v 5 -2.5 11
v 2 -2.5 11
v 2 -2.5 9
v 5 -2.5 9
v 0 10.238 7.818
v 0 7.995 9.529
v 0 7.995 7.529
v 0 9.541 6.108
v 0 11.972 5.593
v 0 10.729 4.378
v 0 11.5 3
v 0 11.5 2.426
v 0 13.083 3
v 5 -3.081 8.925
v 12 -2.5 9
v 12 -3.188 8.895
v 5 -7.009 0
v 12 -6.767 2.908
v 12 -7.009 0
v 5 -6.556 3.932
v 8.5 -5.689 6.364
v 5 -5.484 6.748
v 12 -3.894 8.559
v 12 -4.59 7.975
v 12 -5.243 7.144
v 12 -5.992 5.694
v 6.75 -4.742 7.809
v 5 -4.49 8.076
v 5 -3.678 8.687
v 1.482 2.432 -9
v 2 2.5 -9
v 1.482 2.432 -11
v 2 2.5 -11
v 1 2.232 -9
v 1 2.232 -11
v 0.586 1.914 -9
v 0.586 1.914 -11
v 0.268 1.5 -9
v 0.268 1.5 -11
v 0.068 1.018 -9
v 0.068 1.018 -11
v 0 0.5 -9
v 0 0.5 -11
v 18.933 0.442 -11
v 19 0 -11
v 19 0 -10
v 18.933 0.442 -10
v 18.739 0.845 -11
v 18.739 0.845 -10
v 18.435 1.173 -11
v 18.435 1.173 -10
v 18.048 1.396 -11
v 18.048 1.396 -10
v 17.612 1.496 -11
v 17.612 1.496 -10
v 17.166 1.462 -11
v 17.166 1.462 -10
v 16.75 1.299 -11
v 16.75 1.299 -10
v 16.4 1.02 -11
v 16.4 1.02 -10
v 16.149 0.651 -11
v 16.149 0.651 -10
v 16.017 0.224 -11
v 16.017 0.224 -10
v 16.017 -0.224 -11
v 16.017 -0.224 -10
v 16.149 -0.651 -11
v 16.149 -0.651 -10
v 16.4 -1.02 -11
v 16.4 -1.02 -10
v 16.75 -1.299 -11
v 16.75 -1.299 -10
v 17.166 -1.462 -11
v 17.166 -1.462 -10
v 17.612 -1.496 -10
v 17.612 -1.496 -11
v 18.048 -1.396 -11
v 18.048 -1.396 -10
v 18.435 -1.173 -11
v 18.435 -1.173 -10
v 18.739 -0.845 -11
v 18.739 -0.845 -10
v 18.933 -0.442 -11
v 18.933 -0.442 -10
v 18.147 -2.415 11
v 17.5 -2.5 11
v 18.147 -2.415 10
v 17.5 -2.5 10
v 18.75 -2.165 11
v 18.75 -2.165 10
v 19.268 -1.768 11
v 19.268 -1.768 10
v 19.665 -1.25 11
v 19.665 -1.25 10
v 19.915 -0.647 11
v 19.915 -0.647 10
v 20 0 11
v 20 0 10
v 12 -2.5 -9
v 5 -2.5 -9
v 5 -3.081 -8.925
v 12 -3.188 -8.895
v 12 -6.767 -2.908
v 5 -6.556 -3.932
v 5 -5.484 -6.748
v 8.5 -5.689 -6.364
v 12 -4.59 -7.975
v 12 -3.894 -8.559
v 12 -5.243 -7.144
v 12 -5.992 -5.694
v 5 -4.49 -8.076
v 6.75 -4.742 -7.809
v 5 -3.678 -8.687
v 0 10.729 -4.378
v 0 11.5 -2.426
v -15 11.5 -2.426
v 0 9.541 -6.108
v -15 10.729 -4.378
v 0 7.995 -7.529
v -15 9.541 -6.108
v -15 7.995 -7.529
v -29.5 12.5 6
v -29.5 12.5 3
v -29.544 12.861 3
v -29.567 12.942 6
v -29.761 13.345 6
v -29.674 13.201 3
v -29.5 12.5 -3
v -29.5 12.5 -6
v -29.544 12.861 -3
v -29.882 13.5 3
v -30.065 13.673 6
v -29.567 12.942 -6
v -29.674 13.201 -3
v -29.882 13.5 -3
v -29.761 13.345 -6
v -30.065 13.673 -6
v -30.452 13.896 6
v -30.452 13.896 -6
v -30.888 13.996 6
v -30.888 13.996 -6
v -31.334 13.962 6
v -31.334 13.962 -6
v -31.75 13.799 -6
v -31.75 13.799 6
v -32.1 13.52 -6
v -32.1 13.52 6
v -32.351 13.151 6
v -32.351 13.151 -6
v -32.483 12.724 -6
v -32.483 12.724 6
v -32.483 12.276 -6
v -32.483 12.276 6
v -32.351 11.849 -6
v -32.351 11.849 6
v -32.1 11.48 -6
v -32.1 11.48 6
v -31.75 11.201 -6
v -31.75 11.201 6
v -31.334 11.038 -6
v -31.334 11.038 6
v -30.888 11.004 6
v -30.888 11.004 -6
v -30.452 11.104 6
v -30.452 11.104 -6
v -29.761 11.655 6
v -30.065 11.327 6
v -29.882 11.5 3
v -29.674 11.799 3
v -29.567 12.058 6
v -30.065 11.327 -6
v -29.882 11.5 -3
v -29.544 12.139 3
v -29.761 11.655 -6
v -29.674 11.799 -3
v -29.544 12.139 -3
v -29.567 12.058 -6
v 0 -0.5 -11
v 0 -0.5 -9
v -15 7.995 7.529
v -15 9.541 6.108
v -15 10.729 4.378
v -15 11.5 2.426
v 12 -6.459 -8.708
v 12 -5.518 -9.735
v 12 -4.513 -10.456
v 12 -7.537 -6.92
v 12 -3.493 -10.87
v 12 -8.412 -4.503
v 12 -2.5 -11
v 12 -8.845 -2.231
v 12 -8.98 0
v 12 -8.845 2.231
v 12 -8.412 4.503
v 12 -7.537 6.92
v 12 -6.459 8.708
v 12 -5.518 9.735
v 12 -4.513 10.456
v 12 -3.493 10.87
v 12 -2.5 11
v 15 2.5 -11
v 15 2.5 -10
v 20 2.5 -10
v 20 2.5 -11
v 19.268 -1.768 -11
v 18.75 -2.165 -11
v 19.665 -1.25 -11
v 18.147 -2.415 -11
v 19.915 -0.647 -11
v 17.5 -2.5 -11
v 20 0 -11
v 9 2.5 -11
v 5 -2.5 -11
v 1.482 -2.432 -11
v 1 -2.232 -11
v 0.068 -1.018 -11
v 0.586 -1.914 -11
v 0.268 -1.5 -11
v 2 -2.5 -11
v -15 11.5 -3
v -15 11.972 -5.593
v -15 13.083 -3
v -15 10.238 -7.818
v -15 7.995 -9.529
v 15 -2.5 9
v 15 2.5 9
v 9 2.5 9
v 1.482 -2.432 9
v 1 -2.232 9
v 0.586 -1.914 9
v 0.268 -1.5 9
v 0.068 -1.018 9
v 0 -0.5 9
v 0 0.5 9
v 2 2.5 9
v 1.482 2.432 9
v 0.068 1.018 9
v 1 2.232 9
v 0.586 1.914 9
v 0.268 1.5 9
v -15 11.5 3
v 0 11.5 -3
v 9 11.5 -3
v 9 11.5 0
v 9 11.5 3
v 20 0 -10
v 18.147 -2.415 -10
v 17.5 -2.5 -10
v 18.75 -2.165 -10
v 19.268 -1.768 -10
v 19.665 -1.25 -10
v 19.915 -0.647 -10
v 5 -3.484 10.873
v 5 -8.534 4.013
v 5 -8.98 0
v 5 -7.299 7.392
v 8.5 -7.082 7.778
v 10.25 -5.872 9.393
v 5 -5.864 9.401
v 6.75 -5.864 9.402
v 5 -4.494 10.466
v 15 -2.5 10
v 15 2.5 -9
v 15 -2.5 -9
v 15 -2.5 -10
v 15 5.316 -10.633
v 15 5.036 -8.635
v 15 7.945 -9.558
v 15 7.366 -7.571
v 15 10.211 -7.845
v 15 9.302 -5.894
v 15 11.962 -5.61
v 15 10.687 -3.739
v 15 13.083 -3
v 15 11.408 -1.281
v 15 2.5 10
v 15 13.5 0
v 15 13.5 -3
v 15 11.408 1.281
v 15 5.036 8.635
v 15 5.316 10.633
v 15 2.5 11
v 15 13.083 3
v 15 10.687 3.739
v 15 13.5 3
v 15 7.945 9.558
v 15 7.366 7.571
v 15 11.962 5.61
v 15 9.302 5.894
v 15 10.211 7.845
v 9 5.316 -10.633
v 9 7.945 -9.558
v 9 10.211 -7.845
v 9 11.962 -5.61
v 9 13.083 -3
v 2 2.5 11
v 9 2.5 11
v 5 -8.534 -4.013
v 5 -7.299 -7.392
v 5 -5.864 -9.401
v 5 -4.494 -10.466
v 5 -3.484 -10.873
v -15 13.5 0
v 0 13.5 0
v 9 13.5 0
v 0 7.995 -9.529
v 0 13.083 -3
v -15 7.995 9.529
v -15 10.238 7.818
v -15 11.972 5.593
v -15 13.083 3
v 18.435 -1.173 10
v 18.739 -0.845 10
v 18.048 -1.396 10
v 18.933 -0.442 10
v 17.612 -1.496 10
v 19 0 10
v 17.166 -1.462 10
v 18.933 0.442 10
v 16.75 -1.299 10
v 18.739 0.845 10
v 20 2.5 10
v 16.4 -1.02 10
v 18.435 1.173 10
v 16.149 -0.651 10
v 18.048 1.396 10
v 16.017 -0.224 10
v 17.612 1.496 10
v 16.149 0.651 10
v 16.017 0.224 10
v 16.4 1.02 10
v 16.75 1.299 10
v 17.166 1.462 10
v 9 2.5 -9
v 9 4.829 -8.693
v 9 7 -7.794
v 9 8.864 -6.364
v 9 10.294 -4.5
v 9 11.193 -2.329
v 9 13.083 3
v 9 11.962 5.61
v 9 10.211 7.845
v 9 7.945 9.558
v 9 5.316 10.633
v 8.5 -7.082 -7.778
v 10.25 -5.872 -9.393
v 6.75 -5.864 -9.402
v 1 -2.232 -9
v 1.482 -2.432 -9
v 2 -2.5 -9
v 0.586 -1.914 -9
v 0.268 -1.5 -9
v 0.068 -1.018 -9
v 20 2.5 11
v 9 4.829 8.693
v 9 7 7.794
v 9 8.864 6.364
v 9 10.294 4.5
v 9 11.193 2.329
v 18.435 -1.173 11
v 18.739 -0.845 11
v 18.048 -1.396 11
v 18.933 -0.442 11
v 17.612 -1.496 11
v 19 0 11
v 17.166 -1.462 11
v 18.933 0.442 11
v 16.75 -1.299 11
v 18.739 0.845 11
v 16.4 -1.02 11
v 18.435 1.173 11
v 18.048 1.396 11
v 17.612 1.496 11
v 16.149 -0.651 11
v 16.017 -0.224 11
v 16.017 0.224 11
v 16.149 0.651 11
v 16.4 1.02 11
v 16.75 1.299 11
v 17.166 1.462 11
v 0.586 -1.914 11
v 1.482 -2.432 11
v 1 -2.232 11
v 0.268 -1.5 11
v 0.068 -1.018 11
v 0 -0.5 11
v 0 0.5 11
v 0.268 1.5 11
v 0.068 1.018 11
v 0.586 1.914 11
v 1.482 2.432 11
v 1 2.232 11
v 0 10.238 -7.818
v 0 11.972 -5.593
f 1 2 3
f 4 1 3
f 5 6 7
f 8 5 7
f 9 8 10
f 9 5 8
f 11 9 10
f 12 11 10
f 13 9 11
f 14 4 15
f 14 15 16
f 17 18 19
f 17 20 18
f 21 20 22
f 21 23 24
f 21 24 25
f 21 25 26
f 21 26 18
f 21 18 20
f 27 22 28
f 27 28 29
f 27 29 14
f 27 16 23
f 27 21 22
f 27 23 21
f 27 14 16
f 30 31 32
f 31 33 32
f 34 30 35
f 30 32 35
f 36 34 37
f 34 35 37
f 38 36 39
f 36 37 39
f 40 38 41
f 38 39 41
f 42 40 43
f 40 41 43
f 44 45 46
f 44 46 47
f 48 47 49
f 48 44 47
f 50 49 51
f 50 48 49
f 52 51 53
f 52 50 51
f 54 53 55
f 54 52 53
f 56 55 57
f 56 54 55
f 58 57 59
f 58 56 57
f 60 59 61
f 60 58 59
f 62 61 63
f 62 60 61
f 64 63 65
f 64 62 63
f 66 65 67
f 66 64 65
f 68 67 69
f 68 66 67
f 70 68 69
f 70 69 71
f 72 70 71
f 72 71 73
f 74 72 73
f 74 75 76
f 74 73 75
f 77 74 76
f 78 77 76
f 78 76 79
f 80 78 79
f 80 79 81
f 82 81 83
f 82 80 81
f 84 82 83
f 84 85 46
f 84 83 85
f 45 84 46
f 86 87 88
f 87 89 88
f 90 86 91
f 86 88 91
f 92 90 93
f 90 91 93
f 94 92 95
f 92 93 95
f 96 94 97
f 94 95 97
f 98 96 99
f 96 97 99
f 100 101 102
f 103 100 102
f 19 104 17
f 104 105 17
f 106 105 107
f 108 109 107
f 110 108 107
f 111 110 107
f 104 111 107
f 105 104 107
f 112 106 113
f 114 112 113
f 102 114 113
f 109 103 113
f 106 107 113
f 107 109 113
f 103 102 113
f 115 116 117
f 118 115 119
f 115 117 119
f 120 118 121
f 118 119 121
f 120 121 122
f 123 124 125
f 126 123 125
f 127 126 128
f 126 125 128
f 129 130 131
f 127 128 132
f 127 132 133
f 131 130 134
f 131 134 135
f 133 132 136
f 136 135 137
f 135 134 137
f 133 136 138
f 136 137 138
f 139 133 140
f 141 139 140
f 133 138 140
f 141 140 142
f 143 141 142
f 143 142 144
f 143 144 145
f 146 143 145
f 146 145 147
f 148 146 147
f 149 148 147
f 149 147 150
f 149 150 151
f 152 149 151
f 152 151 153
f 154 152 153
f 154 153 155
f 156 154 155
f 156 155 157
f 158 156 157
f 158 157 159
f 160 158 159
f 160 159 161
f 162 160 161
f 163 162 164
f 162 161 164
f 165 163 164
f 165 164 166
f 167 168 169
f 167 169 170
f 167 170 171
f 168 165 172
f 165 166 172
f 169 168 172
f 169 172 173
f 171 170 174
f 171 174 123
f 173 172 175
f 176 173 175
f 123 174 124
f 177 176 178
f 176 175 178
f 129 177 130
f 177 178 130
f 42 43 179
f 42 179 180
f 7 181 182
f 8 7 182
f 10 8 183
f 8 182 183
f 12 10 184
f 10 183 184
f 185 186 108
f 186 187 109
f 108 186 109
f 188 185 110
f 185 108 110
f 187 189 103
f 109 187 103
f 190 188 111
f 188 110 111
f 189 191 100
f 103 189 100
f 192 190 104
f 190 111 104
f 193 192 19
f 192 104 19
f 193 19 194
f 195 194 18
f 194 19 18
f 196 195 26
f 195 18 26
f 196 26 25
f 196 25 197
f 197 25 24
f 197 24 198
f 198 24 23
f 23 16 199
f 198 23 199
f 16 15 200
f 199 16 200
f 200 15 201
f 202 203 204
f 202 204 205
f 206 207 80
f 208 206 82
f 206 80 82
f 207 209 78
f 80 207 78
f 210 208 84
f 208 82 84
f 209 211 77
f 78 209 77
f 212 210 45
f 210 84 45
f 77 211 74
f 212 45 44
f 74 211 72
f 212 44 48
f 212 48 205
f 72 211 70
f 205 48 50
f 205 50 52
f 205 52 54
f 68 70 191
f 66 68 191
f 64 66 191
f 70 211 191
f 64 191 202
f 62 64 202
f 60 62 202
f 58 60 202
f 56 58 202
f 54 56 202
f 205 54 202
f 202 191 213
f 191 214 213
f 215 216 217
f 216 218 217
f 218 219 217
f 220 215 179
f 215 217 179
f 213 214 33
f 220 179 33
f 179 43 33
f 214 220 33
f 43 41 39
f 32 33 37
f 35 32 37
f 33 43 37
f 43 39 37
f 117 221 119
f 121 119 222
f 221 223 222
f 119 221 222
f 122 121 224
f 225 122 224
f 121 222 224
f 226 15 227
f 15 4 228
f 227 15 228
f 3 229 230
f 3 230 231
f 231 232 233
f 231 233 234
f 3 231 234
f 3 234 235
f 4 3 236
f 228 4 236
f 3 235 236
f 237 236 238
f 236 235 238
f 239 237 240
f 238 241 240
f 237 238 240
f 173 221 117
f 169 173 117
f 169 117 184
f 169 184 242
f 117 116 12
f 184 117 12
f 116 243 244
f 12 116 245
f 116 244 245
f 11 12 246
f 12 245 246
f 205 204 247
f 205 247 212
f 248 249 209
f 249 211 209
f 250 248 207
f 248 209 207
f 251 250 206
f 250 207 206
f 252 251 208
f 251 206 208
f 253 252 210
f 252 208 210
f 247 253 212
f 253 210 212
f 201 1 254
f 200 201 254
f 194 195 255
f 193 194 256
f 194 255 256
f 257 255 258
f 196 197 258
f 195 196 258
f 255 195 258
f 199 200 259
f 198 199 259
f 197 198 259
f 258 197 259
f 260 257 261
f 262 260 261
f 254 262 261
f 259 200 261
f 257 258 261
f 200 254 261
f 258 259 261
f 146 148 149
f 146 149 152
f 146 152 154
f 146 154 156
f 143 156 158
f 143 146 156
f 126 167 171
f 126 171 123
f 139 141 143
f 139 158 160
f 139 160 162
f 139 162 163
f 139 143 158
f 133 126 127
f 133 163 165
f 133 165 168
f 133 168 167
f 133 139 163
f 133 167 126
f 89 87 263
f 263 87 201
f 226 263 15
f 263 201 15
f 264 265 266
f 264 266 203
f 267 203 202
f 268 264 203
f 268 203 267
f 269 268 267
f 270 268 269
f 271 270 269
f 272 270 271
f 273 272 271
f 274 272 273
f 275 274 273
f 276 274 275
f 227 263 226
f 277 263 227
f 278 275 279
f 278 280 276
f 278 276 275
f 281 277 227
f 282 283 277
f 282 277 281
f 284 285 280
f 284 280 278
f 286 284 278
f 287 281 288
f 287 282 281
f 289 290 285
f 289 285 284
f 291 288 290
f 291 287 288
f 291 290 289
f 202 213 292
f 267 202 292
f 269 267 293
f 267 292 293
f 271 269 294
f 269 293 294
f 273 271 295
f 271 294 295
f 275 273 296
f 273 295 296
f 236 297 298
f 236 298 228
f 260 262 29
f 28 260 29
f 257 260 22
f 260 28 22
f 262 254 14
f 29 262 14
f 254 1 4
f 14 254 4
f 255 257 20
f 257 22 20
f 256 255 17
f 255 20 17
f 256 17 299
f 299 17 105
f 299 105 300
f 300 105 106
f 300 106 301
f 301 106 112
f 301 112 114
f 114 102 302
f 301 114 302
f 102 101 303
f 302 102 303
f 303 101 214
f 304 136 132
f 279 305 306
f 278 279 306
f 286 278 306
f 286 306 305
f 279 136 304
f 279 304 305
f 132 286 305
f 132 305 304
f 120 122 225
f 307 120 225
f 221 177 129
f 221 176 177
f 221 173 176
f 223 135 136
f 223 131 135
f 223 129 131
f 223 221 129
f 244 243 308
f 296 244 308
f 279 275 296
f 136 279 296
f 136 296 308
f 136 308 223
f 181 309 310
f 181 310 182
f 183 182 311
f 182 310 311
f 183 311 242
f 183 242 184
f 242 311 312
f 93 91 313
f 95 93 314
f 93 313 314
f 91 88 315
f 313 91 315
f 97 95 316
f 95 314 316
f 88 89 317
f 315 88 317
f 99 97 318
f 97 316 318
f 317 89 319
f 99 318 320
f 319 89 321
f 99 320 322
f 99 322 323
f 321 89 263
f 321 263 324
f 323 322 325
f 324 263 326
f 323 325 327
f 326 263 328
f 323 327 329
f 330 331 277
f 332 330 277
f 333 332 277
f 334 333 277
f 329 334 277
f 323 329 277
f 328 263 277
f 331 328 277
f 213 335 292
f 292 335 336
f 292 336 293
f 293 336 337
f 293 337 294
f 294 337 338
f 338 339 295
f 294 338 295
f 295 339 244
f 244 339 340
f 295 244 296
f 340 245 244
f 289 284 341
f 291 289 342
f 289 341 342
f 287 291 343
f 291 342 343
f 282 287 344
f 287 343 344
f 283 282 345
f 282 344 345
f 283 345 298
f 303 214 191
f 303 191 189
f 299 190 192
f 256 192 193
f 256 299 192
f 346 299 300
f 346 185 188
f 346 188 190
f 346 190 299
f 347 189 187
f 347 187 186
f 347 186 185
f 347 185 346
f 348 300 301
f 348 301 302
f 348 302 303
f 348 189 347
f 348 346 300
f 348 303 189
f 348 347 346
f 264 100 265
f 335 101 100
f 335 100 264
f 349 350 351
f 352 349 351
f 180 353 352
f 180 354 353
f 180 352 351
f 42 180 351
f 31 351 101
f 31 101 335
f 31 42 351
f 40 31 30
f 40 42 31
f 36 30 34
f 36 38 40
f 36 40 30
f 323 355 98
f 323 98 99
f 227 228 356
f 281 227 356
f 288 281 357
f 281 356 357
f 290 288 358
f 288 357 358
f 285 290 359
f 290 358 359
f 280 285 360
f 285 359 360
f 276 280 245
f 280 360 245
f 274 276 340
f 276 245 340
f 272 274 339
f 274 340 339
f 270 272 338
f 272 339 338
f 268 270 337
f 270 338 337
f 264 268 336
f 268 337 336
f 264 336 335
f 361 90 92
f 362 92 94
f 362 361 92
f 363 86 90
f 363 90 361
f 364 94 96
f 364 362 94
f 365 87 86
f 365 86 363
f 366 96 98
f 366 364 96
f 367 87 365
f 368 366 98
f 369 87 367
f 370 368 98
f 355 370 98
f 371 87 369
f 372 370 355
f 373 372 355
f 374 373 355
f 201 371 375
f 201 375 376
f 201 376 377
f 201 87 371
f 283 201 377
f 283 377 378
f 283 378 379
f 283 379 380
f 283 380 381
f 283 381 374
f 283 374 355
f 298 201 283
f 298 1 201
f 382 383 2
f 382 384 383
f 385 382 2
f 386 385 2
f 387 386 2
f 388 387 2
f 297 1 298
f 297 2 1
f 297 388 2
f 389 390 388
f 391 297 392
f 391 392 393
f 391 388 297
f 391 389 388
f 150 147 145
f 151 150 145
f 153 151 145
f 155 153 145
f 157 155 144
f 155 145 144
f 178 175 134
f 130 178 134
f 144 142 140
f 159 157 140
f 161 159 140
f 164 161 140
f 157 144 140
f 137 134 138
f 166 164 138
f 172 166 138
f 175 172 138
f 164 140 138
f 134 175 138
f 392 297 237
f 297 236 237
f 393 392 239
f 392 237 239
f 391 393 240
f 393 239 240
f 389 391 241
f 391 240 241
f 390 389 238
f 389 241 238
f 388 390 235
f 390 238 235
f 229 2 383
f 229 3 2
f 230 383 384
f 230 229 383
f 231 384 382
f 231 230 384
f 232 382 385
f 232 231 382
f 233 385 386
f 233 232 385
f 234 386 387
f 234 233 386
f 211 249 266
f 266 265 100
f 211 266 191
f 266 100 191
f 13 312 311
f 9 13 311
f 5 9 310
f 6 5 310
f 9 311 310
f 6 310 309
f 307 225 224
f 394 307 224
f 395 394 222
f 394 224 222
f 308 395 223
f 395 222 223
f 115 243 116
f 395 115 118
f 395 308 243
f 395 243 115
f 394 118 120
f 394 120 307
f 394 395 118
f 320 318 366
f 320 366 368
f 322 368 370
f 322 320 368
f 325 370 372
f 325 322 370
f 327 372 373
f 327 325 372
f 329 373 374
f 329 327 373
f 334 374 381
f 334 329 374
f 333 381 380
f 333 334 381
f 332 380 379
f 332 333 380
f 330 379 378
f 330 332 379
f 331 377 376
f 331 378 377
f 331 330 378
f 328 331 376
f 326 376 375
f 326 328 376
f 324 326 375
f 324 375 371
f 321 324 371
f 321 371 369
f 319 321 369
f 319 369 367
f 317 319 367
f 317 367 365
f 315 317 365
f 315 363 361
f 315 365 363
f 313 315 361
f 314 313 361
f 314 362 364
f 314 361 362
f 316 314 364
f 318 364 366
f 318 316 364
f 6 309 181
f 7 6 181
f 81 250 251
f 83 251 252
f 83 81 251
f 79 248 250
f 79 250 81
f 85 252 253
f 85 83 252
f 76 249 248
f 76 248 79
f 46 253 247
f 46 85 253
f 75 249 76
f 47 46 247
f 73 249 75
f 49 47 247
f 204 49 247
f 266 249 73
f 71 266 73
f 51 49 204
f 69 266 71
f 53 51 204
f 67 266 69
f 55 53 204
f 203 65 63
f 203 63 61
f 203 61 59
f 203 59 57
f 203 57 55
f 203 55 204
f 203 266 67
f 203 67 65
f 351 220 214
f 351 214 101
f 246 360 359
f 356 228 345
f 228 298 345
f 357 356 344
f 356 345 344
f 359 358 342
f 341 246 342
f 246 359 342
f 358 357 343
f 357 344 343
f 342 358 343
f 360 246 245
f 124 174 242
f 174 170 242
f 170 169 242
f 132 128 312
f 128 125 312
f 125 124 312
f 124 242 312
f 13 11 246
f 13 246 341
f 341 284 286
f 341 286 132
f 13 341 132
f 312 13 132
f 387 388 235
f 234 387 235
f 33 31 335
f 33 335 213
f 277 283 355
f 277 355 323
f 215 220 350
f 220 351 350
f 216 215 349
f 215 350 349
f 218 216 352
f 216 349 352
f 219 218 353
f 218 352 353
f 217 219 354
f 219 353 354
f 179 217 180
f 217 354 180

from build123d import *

# Parameters (mm, degrees)
SKETCH1_W                = 2
SKETCH1_H                = 5
BOSS_EXTRUDE1_DEPTH      = 15
BOSS_EXTRUDE1_2_DEPTH    = 15
SKETCH2_W                = 1
SKETCH2_H                = 5
BOSS_EXTRUDE2_DEPTH      = 5
CUT_EXTRUDE1_DEPTH       = 30.107559156
CUT_EXTRUDE1_DEPTH_BACK  = 30.107559156
SKETCH3_R                = 1.5
SWEEP1_START             = 9
SWEEP1_DEPTH             = 6
BOSS_EXTRUDE3_DEPTH      = 12
CUT_EXTRUDE2_DEPTH       = 5
FILLET1_R                = 2
BOSS_EXTRUDE6_START      = -6
SKETCH7_W                = 6
SKETCH7_H                = 2
BOSS_EXTRUDE6_DEPTH      = 46
BOSS_EXTRUDE7_DEPTH      = 3
BOSS_EXTRUDE7_DEPTH_BACK = 9
SKETCH8_R                = 1.5
FILLET2_R                = 2.5
BOSS_EXTRUDE10_DEPTH     = 15


# Read off the part's stored shape, not the designer's step: Sweep1
with BuildPart() as part:
    # Sketch1 → Boss-Extrude1 (new body)
    with BuildSketch(Plane(origin=(0, 0, 0), x_dir=(0, 0, -1), z_dir=(1, 0, 0))):
        with Locations((-10, 0)):
            Rectangle(SKETCH1_W, SKETCH1_H)
    extrude(amount=BOSS_EXTRUDE1_DEPTH)



with BuildPart() as body_2:
    # Sketch1 → Boss-Extrude1 2 (new body)
    with BuildSketch(Plane(origin=(0, 0, 0), x_dir=(0, 0, -1), z_dir=(1, 0, 0))):
        with Locations((10, 0)):
            Rectangle(SKETCH1_W, SKETCH1_H)
    extrude(amount=BOSS_EXTRUDE1_2_DEPTH)


with BuildPart() as part_1:
    add(part.part)

    add(body_2.part)  # Boss-Extrude2 merges body 2
    # Sketch2 → Boss-Extrude2 (add)
    with BuildSketch(Plane(origin=(15, 0, 0), x_dir=(0, 0, -1), z_dir=(1, 0, 0))):
        with Locations((10.5, 0)):
            Rectangle(SKETCH2_W, SKETCH2_H)
        with Locations((-10.5, 0)):
            Rectangle(SKETCH2_W, SKETCH2_H)
    extrude(amount=BOSS_EXTRUDE2_DEPTH)

    # Sketch3 → Cut-Extrude1 (cut, two sides: drawn at the far end of the back side and taken through both)
    with BuildSketch(Plane.XY.offset(-10).offset(-CUT_EXTRUDE1_DEPTH_BACK)):
        with Locations((17.5, 0)):
            Circle(SKETCH3_R)
    extrude(amount=CUT_EXTRUDE1_DEPTH + CUT_EXTRUDE1_DEPTH_BACK, mode=Mode.SUBTRACT)

    # Sweep1 outline → Sweep1 (add)
    with BuildSketch(Plane.YZ.offset(SWEEP1_START)):
        with BuildLine():
            ThreePointArc((2.5, -11), (13.5, 0), (2.5, 11))
            Line((2.5, 11), (2.5, 9))
            ThreePointArc((2.5, 9), (11.5, 0), (2.5, -9))
            Line((2.5, -9), (2.5, -11))
        make_face()
    extrude(amount=SWEEP1_DEPTH)

    # Sketch5 → Boss-Extrude3 (add)
    with BuildSketch(Plane(origin=(0, 0, 0), x_dir=(0, 0, -1), z_dir=(1, 0, 0))):
        with BuildLine():
            Line((-9, -2.5), (-11, -2.5))
            add(Edge.make_bspline(
                [(-11, -2.5), (-11, -8.980170496), (0, -8.980170496)],
                knots=[3.141592654, 3.141592654, 3.141592654, 4.71238898, 4.71238898, 4.71238898], degree=2, weights=[1, 0.707106781, 1]))
            Line((0, -8.980170496), (0, -7.009343108))
            add(Edge.make_bspline(
                [(-9, -2.5), (-9, -7.009343108), (0, -7.009343108)],
                knots=[3.141592654, 3.141592654, 3.141592654, 4.71238898, 4.71238898, 4.71238898], degree=2, weights=[1, 0.707106781, 1]))
        make_face()
    boss_extrude3 = extrude(amount=BOSS_EXTRUDE3_DEPTH)

    # Sketch6 → Cut-Extrude2 (cut)
    with BuildSketch(Plane.ZY):
        with BuildLine():
            Line((11, -2.5), (9, -2.5))
            add(Edge.make_bspline(
                [(0, -7.009343108), (9, -7.009343108), (9, -2.5)],
                knots=[4.71238898, 4.71238898, 4.71238898, 6.283185307, 6.283185307, 6.283185307], degree=2, weights=[1, 0.707106781, 1]))
            Line((0, -7.009343108), (0, -8.980170496))
            add(Edge.make_bspline(
                [(0, -8.980170496), (11, -8.980170496), (11, -2.5)],
                knots=[4.71238898, 4.71238898, 4.71238898, 6.283185307, 6.283185307, 6.283185307], degree=2, weights=[1, 0.707106781, 1]))
        make_face()
    cut_extrude2 = extrude(amount=-CUT_EXTRUDE2_DEPTH, mode=Mode.SUBTRACT)

    # Mirror2: Boss-Extrude3, Cut-Extrude2 across plane
    add(boss_extrude3.mirror(Plane(origin=(12, -8.980170496, 0), x_dir=(1, 0, 0), z_dir=(0, 0, 1))))
    add(cut_extrude2.mirror(Plane(origin=(12, -8.980170496, 0), x_dir=(1, 0, 0), z_dir=(0, 0, 1))), mode=Mode.SUBTRACT)

    # Fillet1
    fillet1_edges = [part_1.edges().sort_by_distance(p)[0] for p in [
        (0, -2.5, -10),
        (0, 2.5, -10),
        (0, 2.5, 10),
        (0, -2.5, 10),
    ]]
    fillet(fillet1_edges, radius=FILLET1_R)

    # Sketch7 → Boss-Extrude6 (add)
    with BuildSketch(Plane.ZY.offset(-9).offset(BOSS_EXTRUDE6_START)):
        with Locations((0, 12.5)):
            Rectangle(SKETCH7_W, SKETCH7_H)
    extrude(amount=BOSS_EXTRUDE6_DEPTH)

    # Sketch8 → Boss-Extrude7 (add, two sides: drawn at the far end of the back side and taken through both)
    with BuildSketch(Plane.XY.offset(3).offset(-BOSS_EXTRUDE7_DEPTH_BACK)):
        with Locations((-31, 12.5)):
            Circle(SKETCH8_R)
    extrude(amount=BOSS_EXTRUDE7_DEPTH + BOSS_EXTRUDE7_DEPTH_BACK)

    # Fillet2
    fillet2_edges = [part_1.edges().sort_by_distance(p)[0] for p in [
        (20, -2.5, -10.5),
        (20, -2.5, 10.5),
    ]]
    fillet(fillet2_edges, radius=FILLET2_R)

    # 3DSketch3 → Boss-Extrude10 (add)
    with BuildSketch(Plane(origin=(-15, 7.995255445, 9.529017137), x_dir=(0, 0, -1), z_dir=(1, 0, 0))):
        with BuildLine():
            Line((0, 0), (2, 0))
            ThreePointArc((2, 0), (9.529017137, 3.825899604), (17.058034273, 0))
            Line((17.058034273, 0), (19.058034273, 0))
            ThreePointArc((19.058034273, 0), (15.031388903, 4.029654263), (9.529017137, 5.504744555))
            ThreePointArc((9.529017137, 5.504744555), (4.026645371, 4.029654263), (0, 0))
        make_face()
    extrude(amount=BOSS_EXTRUDE10_DEPTH)


solid = part_1.part
